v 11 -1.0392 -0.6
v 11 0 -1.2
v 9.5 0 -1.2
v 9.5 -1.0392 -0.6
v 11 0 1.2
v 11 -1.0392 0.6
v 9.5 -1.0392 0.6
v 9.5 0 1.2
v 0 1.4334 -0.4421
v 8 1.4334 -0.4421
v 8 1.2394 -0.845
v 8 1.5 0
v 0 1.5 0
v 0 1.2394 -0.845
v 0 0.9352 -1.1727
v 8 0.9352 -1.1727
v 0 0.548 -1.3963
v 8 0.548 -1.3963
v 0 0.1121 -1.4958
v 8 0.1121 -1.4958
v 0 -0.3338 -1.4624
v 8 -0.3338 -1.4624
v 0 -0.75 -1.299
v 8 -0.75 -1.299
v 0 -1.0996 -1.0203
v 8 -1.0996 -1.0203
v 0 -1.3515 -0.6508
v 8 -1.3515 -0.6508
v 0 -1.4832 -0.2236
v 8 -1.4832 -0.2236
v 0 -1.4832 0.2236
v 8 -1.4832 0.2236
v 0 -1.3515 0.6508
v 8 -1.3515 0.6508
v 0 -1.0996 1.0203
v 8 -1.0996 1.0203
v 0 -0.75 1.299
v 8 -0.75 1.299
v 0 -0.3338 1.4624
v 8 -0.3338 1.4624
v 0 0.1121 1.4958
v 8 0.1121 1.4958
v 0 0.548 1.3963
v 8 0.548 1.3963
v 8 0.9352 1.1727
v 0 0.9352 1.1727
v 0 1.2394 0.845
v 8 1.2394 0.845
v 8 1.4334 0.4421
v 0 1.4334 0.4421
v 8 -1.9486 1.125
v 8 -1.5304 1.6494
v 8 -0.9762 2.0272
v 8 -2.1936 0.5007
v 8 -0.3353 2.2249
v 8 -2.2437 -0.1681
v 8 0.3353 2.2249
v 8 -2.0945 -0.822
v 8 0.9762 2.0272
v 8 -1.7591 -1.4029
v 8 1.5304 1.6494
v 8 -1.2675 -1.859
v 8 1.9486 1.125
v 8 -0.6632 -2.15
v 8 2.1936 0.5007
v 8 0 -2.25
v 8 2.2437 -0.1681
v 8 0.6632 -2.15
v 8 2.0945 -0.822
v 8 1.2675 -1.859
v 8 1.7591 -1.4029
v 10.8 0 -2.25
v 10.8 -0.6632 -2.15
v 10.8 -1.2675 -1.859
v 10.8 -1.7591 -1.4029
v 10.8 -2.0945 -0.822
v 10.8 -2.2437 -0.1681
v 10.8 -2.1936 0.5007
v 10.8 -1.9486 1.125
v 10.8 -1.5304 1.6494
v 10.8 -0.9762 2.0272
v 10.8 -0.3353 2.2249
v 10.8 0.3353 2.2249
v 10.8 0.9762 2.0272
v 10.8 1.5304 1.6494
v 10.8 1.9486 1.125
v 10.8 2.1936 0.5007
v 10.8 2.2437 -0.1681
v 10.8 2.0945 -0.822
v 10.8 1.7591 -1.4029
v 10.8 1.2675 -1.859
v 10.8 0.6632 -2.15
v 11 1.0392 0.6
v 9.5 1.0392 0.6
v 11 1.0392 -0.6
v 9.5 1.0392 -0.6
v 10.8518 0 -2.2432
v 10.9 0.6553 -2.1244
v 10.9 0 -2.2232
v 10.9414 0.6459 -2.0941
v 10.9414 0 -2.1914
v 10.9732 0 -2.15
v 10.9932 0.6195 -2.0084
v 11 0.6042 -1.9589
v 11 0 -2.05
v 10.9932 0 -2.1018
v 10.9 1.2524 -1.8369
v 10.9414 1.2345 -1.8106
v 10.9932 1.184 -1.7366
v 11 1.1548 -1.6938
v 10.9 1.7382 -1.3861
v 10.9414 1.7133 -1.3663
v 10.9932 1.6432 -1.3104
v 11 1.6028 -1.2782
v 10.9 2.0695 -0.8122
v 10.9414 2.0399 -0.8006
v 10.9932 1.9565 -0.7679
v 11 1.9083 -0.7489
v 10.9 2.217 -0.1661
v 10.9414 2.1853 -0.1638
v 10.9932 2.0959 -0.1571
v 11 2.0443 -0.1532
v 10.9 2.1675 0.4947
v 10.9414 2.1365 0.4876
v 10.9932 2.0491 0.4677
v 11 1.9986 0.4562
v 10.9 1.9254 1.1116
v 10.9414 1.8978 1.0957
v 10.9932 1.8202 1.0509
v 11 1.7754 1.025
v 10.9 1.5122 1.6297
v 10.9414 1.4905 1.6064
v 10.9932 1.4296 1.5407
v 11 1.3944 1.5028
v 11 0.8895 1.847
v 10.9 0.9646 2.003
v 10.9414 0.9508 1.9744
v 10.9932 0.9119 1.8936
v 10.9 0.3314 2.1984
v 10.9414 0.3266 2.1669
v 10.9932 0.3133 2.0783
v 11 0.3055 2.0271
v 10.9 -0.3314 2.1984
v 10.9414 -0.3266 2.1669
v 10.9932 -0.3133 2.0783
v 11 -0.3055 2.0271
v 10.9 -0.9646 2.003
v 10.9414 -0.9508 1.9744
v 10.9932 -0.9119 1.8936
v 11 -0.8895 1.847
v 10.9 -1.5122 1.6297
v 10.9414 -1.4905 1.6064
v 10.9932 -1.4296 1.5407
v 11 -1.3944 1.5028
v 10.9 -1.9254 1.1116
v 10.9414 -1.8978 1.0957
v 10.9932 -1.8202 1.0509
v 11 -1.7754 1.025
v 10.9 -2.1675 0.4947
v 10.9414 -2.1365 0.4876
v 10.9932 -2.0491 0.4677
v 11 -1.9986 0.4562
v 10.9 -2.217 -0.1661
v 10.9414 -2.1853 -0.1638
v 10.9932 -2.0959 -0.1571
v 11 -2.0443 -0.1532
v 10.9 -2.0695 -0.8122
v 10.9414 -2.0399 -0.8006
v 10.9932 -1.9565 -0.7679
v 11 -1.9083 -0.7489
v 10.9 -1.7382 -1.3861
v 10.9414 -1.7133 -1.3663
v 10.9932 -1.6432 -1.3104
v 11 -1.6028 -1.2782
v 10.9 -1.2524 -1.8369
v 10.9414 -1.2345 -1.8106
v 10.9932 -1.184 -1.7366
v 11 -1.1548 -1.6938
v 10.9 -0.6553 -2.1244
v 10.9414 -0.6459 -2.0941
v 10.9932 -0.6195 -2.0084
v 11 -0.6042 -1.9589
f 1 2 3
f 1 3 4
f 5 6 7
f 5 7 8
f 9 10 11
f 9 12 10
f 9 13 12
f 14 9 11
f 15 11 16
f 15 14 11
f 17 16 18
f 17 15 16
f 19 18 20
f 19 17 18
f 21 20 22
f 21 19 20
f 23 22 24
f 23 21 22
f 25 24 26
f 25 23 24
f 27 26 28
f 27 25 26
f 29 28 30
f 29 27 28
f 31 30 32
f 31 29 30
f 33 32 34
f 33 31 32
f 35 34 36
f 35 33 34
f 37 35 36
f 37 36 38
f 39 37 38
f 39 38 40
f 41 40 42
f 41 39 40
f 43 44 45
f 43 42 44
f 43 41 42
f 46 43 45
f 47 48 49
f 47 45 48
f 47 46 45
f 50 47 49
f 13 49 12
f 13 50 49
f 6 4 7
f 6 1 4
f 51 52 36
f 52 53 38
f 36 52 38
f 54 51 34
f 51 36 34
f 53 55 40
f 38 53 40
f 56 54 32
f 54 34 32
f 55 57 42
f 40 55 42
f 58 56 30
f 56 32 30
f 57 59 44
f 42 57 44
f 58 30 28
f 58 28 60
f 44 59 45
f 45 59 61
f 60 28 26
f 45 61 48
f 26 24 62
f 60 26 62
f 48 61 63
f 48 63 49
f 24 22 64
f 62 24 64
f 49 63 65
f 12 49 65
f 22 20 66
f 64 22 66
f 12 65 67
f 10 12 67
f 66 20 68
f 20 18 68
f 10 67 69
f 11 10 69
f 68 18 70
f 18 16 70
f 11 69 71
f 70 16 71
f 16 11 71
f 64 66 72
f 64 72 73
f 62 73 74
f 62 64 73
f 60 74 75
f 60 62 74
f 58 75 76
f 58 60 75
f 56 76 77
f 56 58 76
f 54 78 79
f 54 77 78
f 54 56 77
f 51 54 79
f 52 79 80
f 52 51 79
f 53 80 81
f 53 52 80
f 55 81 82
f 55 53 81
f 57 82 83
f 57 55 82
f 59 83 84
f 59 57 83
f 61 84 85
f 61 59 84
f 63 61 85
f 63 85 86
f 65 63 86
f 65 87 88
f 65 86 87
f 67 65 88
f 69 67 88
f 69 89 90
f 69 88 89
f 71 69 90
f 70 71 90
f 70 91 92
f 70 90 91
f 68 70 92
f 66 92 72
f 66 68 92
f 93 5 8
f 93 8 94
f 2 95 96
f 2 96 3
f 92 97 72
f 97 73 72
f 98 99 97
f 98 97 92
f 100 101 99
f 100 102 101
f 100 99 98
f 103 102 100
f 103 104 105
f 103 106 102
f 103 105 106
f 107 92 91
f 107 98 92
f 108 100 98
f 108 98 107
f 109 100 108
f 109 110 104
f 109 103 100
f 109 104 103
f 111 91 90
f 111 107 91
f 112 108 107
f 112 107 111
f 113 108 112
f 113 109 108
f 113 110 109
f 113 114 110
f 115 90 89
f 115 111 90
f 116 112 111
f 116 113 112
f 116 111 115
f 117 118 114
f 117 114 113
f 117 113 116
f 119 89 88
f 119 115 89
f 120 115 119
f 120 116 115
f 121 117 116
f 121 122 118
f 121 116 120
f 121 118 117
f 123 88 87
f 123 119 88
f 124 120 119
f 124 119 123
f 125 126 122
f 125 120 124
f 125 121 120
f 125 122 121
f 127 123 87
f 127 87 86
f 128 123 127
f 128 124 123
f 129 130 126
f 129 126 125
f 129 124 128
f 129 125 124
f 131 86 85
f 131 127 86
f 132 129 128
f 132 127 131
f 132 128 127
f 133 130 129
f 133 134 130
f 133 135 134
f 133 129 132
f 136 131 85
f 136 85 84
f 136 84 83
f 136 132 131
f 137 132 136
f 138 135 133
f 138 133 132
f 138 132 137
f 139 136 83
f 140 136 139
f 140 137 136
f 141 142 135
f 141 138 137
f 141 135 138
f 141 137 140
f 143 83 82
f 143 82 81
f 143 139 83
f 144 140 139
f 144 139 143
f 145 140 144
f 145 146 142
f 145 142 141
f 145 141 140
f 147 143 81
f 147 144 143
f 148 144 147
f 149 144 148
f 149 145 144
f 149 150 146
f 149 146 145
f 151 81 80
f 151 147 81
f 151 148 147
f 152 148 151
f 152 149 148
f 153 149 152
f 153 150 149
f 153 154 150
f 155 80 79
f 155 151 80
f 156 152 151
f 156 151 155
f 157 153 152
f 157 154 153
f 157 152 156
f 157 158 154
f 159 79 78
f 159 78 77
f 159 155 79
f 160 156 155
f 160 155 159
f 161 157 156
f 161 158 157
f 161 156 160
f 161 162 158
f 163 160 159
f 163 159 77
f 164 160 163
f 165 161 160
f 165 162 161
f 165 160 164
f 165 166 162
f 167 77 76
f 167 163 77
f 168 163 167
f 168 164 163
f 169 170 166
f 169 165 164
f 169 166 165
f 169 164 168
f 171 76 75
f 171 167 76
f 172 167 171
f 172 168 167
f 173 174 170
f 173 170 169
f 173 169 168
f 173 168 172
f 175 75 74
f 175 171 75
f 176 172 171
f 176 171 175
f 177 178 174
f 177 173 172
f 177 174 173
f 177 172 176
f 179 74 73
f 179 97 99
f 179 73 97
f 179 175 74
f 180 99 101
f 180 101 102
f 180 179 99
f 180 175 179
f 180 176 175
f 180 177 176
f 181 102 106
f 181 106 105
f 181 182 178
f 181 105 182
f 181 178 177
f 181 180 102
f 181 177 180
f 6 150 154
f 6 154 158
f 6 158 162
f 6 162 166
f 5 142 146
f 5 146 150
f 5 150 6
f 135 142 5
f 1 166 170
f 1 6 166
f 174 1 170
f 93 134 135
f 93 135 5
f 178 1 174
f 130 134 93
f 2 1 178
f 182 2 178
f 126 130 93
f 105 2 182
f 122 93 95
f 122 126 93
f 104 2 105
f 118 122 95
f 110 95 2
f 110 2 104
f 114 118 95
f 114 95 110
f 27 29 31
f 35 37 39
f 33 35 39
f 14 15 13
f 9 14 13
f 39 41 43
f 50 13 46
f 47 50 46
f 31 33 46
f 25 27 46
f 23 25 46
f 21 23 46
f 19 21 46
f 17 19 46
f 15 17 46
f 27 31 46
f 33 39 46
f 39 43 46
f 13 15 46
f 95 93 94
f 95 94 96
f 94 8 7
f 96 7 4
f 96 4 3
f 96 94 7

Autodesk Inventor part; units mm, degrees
ref_plane "YZ Plane" through (0, 0, 0) normal (1, 0, 0) x (0, 1, 0)
ref_plane "XZ Plane" through (0, 0, 0) normal (0, 1, 0) x (-1, 0, 0)
sketch "Sketch1" plane through (0, 0, 0) normal (1, 0, 0) x (0, 1, 0)
  circle A0 centre (0, 0) radius 1.5
  dimension "d0" = 3
extrude "Extrusion1" add sketch "Sketch1" along normal blind 8
sketch "Sketch2" plane through (8, 0, 0) normal (1, 0, 0) x (0, 0, -1)
  circle A0 centre (0, 0) radius 2.25
  dimension "d3" = 4.5
extrude "Extrusion2" add sketch "Sketch2" along normal blind 3
ref_plane "Work Plane1" through (13.5, 0, 0) normal (1, 0, 0) x (0, 0, -1)
fillet "Fillet2" radius 0.2 1 edges at (11, 0, 2.25)
sketch "Sketch4" plane through (11, 0, 0) normal (1, 0, 0) x (0, 0, -1)
  line L0 (1.2, 0) -> (0.6, -1.0392)
  line L1 (0.6, -1.0392) -> (-0.6, -1.0392)
  line L2 (-0.6, -1.0392) -> (-1.2, 0)
  line L3 (-1.2, 0) -> (-0.6, 1.0392)
  line L4 (-0.6, 1.0392) -> (0.6, 1.0392)
  line L5 (0.6, 1.0392) -> (1.2, 0)
  point P0 (0, 0)
  point P1 (0, 0)
  dimension "d14" = 2.4
  dimension "d15" = 1.0392
extrude "Extrusion4" cut sketch "Sketch4" against normal blind 1.5
properties part number "M3" material "Iron, Cast"
